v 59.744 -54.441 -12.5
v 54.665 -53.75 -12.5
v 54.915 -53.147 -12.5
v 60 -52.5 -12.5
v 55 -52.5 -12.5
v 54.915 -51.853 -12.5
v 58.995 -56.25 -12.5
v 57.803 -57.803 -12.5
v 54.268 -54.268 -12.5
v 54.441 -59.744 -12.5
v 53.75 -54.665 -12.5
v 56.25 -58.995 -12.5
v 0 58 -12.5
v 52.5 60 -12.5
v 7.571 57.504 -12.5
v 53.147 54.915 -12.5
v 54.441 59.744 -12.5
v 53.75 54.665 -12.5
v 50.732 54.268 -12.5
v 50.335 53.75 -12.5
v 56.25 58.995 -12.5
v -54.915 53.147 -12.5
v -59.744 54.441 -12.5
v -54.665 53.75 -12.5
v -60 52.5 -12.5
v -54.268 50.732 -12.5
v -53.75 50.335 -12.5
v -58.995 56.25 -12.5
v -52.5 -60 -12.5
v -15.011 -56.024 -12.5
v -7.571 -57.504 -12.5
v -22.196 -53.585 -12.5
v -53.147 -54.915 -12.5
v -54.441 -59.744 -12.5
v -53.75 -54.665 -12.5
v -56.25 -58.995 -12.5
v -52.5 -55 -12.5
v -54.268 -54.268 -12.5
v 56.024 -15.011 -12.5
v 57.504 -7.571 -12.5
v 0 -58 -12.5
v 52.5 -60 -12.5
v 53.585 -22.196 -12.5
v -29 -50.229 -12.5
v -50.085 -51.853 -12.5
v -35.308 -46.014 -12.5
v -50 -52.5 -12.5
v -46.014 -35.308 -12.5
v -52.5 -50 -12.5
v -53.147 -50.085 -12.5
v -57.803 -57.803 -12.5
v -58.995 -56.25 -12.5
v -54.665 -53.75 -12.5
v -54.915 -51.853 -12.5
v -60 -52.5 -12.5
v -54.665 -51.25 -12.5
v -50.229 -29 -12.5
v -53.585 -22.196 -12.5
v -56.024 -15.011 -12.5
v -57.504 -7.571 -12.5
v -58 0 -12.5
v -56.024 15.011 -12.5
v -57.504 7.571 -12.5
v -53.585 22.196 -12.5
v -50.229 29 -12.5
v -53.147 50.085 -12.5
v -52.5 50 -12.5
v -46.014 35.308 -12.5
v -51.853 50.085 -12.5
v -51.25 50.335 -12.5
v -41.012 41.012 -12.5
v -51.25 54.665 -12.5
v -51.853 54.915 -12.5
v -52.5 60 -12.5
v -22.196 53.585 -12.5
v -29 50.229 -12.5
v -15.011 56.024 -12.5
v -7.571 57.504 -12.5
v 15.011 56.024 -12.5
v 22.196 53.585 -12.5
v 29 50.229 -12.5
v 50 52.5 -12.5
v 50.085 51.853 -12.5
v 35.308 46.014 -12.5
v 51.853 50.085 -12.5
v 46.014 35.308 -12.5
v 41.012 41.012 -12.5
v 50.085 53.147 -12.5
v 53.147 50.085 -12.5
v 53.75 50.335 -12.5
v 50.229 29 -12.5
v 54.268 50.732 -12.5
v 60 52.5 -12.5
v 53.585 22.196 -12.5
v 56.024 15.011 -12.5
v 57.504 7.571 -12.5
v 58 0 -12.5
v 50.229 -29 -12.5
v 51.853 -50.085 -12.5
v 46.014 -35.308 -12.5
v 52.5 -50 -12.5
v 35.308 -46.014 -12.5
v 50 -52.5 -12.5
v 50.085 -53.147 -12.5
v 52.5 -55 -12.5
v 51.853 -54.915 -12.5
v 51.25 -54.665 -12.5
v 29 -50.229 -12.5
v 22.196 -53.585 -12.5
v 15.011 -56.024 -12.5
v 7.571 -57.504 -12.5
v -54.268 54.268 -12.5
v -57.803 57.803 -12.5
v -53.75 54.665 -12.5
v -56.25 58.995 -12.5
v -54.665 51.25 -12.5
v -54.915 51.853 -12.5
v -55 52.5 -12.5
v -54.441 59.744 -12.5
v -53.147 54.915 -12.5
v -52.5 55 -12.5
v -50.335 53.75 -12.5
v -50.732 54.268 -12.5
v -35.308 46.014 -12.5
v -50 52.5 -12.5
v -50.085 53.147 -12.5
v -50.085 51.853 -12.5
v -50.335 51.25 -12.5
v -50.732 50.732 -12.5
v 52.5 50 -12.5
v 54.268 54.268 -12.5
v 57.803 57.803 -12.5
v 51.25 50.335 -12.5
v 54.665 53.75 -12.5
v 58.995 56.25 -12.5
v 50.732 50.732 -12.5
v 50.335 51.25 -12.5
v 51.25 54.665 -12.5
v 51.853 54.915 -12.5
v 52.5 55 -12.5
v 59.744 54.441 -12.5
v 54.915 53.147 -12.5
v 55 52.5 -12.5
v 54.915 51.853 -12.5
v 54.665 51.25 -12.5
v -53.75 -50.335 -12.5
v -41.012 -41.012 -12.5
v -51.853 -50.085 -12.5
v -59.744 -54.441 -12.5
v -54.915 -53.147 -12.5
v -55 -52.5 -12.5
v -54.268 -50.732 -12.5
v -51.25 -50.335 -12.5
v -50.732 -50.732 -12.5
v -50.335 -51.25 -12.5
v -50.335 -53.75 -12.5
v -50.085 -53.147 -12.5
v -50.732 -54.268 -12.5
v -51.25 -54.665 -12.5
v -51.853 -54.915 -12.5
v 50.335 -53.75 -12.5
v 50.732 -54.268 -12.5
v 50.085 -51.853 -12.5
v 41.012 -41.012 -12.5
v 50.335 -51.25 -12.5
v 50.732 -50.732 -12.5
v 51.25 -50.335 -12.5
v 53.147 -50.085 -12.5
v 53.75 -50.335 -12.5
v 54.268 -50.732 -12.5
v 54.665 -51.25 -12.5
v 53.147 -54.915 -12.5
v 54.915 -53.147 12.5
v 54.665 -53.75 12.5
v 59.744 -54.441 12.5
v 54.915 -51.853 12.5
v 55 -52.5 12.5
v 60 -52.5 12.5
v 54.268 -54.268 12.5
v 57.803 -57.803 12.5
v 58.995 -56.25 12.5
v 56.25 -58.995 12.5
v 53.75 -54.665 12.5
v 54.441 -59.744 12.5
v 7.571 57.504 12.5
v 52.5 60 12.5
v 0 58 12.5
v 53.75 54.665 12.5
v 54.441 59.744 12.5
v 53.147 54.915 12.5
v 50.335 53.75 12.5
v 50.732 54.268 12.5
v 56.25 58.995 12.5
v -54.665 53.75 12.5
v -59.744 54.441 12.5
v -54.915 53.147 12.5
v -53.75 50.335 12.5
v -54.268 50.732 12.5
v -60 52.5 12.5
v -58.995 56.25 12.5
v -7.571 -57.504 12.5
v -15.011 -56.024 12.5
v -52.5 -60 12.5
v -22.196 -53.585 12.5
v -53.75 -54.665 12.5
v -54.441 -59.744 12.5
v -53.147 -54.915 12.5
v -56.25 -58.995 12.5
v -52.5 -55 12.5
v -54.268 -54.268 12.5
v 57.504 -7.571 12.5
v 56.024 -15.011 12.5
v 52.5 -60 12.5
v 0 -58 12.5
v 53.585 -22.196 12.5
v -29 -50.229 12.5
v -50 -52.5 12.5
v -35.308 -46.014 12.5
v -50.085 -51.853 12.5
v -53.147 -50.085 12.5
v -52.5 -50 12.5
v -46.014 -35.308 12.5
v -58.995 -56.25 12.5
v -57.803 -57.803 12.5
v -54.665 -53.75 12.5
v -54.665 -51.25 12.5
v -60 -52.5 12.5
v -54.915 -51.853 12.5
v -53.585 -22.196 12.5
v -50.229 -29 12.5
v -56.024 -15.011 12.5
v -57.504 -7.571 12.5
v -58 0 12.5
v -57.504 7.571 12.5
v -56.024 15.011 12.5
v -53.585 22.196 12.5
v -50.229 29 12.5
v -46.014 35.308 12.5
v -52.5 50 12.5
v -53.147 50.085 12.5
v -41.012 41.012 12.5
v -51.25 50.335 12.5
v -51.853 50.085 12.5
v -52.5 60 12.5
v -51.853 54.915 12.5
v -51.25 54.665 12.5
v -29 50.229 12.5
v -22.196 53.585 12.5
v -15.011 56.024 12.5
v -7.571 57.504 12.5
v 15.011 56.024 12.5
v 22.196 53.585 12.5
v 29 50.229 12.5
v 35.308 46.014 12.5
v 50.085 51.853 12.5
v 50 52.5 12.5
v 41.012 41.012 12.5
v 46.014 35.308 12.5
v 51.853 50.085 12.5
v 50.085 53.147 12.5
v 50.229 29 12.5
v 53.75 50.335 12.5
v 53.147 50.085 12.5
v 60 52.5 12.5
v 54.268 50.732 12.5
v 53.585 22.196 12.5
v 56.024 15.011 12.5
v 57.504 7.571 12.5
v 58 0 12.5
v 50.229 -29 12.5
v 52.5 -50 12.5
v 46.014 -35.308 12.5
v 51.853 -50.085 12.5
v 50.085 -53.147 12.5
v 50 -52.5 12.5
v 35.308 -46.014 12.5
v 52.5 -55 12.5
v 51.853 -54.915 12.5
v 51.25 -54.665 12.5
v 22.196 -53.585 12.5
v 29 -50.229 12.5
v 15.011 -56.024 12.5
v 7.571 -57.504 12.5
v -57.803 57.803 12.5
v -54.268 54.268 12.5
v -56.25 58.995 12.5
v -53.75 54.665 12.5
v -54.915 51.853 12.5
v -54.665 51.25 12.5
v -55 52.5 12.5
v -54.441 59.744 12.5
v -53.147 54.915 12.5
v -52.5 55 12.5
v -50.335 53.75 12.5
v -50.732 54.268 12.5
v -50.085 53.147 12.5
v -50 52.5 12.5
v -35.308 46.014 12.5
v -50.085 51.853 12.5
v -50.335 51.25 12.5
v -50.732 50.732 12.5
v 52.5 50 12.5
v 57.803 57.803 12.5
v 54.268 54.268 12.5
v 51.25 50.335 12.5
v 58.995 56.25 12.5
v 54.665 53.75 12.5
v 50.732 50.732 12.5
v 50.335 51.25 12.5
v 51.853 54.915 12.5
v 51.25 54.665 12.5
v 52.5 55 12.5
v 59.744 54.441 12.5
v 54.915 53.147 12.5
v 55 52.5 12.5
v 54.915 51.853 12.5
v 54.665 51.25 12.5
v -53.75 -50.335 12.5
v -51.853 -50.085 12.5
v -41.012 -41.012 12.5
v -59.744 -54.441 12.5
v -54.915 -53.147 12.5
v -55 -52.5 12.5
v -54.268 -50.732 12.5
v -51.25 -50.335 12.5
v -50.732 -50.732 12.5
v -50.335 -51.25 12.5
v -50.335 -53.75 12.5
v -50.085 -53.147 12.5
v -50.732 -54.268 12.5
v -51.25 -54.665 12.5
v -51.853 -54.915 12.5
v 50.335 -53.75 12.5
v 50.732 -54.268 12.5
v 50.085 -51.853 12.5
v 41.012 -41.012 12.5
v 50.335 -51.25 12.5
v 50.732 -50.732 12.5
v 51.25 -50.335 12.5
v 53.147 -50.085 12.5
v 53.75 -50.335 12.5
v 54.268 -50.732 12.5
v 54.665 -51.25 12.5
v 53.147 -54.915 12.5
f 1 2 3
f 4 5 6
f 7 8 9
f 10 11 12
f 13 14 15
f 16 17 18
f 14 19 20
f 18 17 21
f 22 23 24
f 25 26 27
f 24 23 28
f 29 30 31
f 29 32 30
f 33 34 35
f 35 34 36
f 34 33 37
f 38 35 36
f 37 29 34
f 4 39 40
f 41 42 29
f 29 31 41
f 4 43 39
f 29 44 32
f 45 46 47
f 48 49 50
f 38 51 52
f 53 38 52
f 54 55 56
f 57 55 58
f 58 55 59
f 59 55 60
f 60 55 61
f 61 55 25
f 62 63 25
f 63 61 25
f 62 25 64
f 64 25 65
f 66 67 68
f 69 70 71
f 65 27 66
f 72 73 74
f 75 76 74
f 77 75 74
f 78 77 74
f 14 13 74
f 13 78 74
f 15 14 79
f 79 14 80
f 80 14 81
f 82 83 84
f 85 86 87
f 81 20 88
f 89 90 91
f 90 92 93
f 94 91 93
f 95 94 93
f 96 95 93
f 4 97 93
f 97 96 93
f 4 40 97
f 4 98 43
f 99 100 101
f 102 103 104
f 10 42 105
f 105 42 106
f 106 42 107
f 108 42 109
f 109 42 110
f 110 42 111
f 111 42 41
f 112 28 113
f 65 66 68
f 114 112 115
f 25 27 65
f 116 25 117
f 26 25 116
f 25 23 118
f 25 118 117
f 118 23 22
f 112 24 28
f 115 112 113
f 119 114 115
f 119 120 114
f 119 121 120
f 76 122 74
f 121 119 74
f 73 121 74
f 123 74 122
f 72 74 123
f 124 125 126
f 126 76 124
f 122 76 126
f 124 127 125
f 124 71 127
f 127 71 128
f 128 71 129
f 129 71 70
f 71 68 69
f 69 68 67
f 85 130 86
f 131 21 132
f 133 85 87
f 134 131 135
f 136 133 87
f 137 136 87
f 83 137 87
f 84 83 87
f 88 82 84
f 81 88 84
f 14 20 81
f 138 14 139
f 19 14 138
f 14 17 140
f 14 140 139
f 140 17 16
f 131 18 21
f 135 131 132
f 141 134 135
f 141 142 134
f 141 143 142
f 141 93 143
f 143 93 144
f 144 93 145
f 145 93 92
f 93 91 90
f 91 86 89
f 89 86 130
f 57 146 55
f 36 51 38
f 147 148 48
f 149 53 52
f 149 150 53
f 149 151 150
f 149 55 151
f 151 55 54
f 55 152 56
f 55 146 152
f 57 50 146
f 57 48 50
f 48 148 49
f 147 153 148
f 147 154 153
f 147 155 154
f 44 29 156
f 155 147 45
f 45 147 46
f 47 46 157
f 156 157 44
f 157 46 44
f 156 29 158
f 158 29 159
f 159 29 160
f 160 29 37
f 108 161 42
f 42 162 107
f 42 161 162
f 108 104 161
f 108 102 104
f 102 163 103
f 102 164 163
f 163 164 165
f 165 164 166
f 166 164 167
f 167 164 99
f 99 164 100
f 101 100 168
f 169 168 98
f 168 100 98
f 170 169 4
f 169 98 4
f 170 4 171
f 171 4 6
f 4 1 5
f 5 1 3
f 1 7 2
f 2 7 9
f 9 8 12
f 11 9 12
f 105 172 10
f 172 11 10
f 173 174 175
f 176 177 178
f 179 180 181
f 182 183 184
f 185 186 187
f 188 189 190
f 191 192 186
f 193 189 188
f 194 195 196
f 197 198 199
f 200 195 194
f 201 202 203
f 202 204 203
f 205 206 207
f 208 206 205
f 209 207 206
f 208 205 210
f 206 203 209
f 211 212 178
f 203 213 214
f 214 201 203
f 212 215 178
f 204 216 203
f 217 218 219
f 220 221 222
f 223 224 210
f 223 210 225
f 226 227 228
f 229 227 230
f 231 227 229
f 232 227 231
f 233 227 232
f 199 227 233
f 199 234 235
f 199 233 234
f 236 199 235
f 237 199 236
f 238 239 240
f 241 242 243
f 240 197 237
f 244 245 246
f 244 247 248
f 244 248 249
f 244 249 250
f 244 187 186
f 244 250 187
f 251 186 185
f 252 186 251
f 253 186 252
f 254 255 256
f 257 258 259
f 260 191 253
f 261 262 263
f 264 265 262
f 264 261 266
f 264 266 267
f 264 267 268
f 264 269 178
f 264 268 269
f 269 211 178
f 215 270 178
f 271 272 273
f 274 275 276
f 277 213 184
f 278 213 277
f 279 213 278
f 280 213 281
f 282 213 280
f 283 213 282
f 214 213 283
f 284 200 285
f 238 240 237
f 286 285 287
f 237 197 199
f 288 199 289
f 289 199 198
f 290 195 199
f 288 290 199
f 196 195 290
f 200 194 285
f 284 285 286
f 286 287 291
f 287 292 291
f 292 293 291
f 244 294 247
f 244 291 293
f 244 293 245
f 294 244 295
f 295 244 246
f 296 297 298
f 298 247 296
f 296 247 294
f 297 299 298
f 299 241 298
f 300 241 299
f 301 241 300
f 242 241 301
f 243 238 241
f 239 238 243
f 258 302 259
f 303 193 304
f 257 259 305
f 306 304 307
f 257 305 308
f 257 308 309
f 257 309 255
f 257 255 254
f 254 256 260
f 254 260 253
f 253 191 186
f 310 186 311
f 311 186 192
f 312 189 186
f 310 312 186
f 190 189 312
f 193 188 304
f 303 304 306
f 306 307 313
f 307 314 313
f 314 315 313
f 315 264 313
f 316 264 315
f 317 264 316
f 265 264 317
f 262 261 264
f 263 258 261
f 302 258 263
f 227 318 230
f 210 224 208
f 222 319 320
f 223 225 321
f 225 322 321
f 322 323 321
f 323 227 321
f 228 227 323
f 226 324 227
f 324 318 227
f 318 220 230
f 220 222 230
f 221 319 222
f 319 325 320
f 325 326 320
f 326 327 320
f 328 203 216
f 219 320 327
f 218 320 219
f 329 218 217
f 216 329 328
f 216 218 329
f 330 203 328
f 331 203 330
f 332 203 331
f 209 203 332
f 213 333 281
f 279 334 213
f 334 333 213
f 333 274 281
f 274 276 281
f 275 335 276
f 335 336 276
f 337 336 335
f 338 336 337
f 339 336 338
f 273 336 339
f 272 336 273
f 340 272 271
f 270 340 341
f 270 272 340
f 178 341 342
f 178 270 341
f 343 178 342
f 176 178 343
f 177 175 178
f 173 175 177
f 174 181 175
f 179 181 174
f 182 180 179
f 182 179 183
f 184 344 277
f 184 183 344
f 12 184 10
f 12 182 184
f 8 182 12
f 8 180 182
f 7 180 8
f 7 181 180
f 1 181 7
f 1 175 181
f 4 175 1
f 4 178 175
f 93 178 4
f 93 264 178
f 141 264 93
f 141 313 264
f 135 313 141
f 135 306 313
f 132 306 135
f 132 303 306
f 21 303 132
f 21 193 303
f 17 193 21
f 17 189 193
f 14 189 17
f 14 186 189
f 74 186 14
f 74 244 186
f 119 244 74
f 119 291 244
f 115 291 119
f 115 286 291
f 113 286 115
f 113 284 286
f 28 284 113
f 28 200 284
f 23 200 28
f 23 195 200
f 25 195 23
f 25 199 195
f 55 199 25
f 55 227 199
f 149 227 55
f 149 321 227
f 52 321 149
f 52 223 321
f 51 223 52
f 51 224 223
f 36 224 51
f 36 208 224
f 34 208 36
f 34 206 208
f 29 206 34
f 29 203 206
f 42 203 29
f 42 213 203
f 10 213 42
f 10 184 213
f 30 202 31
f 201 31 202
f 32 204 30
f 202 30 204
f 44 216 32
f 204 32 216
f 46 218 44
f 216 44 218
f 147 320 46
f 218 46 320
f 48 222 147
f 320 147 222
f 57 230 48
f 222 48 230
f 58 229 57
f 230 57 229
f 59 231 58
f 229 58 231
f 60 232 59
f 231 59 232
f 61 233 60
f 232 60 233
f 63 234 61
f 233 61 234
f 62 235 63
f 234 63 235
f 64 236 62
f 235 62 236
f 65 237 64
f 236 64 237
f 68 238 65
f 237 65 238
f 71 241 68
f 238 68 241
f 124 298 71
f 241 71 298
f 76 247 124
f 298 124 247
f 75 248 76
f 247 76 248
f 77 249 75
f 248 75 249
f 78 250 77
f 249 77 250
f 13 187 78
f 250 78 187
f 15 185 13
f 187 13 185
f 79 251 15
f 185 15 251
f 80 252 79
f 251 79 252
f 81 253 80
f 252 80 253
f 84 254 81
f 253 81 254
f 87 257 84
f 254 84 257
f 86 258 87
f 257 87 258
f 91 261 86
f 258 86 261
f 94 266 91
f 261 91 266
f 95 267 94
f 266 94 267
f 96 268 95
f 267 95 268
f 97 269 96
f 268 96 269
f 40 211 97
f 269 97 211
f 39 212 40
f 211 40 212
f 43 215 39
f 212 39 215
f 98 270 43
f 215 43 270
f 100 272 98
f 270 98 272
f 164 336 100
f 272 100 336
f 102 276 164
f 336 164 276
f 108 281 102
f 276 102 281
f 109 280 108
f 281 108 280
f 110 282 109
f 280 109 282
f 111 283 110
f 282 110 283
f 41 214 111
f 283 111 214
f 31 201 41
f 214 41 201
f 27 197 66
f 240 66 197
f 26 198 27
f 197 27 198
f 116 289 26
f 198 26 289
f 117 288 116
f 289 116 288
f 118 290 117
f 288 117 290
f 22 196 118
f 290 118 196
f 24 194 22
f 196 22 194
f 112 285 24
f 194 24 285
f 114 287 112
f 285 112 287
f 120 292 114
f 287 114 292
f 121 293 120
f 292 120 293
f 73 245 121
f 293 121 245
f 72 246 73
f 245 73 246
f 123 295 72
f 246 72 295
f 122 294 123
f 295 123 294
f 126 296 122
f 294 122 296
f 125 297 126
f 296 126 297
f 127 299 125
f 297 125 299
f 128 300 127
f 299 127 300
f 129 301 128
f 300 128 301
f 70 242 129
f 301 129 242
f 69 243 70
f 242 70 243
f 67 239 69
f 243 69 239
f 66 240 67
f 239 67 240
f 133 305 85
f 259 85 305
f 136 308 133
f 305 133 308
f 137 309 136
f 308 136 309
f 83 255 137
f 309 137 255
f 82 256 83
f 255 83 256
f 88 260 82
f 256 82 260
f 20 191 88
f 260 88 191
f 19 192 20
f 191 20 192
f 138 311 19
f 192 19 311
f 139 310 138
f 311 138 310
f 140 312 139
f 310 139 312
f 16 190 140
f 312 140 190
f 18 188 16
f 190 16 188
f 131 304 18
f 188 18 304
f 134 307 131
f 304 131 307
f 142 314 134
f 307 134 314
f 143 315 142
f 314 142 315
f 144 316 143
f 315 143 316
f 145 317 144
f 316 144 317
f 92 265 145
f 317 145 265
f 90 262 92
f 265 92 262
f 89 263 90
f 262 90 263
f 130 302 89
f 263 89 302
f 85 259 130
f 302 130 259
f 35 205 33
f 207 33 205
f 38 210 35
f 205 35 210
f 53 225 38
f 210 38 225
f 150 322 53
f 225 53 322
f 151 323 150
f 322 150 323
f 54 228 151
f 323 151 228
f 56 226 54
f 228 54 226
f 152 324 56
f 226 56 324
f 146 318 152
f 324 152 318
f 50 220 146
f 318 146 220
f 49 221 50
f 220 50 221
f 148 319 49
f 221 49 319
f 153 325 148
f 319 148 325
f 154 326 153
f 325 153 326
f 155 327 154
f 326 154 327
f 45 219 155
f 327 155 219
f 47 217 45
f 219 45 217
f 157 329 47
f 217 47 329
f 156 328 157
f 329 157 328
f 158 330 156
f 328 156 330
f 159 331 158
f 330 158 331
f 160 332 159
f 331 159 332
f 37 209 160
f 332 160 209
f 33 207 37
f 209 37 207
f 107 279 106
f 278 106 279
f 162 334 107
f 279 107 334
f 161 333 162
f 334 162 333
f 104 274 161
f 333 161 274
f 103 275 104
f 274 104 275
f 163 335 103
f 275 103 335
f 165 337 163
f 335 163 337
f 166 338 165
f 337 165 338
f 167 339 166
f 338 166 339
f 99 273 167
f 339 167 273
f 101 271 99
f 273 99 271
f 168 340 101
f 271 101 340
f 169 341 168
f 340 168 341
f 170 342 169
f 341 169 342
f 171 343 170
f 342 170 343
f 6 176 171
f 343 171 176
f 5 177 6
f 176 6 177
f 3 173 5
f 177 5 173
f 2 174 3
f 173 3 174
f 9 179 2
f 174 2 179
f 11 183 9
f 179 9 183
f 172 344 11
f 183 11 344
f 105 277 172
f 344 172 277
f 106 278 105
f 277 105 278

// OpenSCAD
// file: ../lib/TOGArrayLib1.scad
// TOGArrayLib1.4
// 
// Functions for working with arrays.
// 
// v1.1:
// - tal1_reduce assert(is_list(items)) to prevent infinite recursion
//   when given undefined or other non-list values
// v1.1.1:
// - Fix tal1_uniq_remap_v2 to return "list-remap-result" as the
//   first element of the returned list
// v1.2:
// - Add tal1_replace_at function
// v1.3:
// - tal1_is_vec_of, tal1_is_vec_of_num
// v1.4:
// - tal1_assert_for_each, for when you want to assert something
//   about each of a list of items and get nice failure messages

/**
 * Make a list with the contents of list `a`,
 * but starting at offset `off`, replaced by the contents of list `b`.
 * len(result) = max(len(a), off+len(b))
 */
function tal1_replace_at(a, off, b, default_value=undef, default_value_function=undef) =
	assert(is_list(a))
	assert(is_list(b))
	let( _dvf = !is_undef(default_value_function) ? default_value_function : function(i) default_value )
[
	for( i=[0:1:min(off,len(a))-1] ) a[i],
	for( i=[len(a):1:off-1] ) _dvf(i),
	for( i=[off:1:off+len(b)-1] ) b[i-off],
	for( i=[off+len(b):1:len(a)-1] ) a[i],
];

// Simplest case
assert([] == tal1_replace_at([], 0, []));
// Second simplest cases
assert(["foo"] == tal1_replace_at(["foo"], 0, []));
assert(["foo"] == tal1_replace_at([], 0, ["foo"]));
// Replace one item
assert(["foo","quux","baz"] == tal1_replace_at(["foo","bar","baz"], 1, ["quux"]));
// Replace and extend
assert(["foo","quux","tuna","tina"] == tal1_replace_at(["foo","bar","baz"], 1, ["quux", "tuna", "tina"]));
// Add beyond end of `a`
assert(["foo","zzz","quux"] == tal1_replace_at(["foo"], 2, ["quux"], default_value="zzz"));
// Adding 'nothing' should still fill to that point with defaults
assert(["foo","zzz","zzz"] == tal1_replace_at(["foo"], 3, [], default_value="zzz"));


function tal1_reduce(start, items, func, offset=0) =
	assert(is_list(items))
	len(items) == offset ? start :
	tal1_reduce(func(start, items[offset]), items, func, offset+1);

function tal1_consecutive_duplicate_count(items) = tal1_reduce(
	[0, undef],
	items,
	function(z,item) [z[0] + (item == z[1] ? 1 : 0), item]
)[0];

assert(0 == tal1_consecutive_duplicate_count([]));
assert(0 == tal1_consecutive_duplicate_count([50]));
assert(1 == tal1_consecutive_duplicate_count([50,50]));
assert(0 == tal1_consecutive_duplicate_count([50,51,52,53]));
assert(1 == tal1_consecutive_duplicate_count([50,51,52,52]));
assert(3 == tal1_consecutive_duplicate_count([50,50,50,50]));

// Set test_size to arbirarily large values
// to ensure that OpenSCAD can handle heavy recursion
let(test_size=1000) assert(test_size/2 == tal1_consecutive_duplicate_count([for(i=[0:1:test_size-1]) floor(i/2)]));



function tal1_uniq_(items, off0, off1) =
	let(chunklen = off1-off0)
	chunklen == 0 ? [] :
	chunklen == 1 ? [items[off0]] :
	let(half=floor(chunklen/2))
	let(left  = tal1_uniq_(items, off0     , off0+half))
	let(right = tal1_uniq_(items, off0+half, off1     ))
	assert(len(left) > 0)
	assert(len(right) > 0)
	left[len(left)-1] == right[0] ? [each left, for(i=[1:1:len(right)-1]) right[i]] :
	[each left, each right];

/** Given a list of items, returns a new list with identical consecutive items merged */
function tal1_uniq(items) = tal1_uniq_(items, 0, len(items));

assert([] == tal1_uniq([]));
assert([123] == tal1_uniq([123]));
assert([55,0,1,2,3] == tal1_uniq([55,0,1,2,3]));
assert([55,0,1,2] == tal1_uniq([55,0,1,1,2]));
assert([55,0,1] == tal1_uniq([55,55,0,0,0,0,0,0,1,1,1,1]));
assert([55,0] == tal1_uniq([55,0,0,0,0,0,0,0]));



/**
 * Returns [new items, old index -> new index mapping].
 * No-op version.
 */
function tal1_uniq_remap_v1(items) =
	["list-remap-result", items, [for (vi=[0:1:len(items)-1]) vi]];

// [a, a, b, b, c, c]
//
// [a,    ...], []  -> [a],[0]
// [a, a, ...], [0] -> [a],[0,0]

assert([1,2,3] == [1,2,3]);

/**
 * Recursive version that will combine adjacent identical vertexes,
 * but will use the original items.
 */
function tal1_uniq_remap_v2(items, map=[]) =
	let(index = len(map))
	len(items) == index ? ["list-remap-result", items, map] :
	index == 0 ? tal1_uniq_remap_v2(items, [0]) :
	items[index] == items[map[index-1]] ? tal1_uniq_remap_v2(items, [for(vi=map) vi, map[index-1]]) :
	tal1_uniq_remap_v2(items, [for(vi=map) vi, index]);

assert(tal1_uniq_remap_v2([1,1,2,2,3,4]) == ["list-remap-result", [1,1,2,2,3,4], [0,0,2,2,4,5]]);


/**
 * Returns true if `vec` is a list of at least min_len items
 * and component_check(each item, even those beyond min_len) is true.
 */
function tal1_is_vec_of(vec, min_len=0, component_check=function(x) true) =
	assert(is_num(min_len) && min_len >= 0)
	assert(is_function(component_check))
	is_list(vec) && len(vec) >= min_len &&
	tal1_reduce(true, vec, function(prev,item) prev && component_check(item));

function tal1_is_vec_of_num(vec, min_len=0) = tal1_is_vec_of(vec, min_len, function(i) is_num(i));

assert( true == tal1_is_vec_of_num([1,2,3]));
assert( true == tal1_is_vec_of_num([]));
assert( true == tal1_is_vec_of_num([1,2,3], 3));
assert(false == tal1_is_vec_of_num([1,2], 3));
assert(false == tal1_is_vec_of_num([1,2,"spoon"], 3));
// Requirements are ambiguous when
// first min_len items are numbers, but there are non-numeric items afterwards,
// so let's error on the side of saying 'no, it's not a list of numbers';
// i.e. the item check and the min_len are independent.
assert(false == tal1_is_vec_of_num([1,2,3,"artichoke"], 3));


/**
 * Asserts that item_checker(each item in list, index of item)[0] is true.
 * Second element of item_checker return value is assertion message.
 * Returns the original list, in case that's useful to you.
 */
function tal1_assert_for_each(list, item_checker) =
	let( _ignored = [ for(i=[0:1:len(list)-1])
		let(q=item_checker(list[i],i))
		let(passed=is_bool(q) ? q : is_list(q) ? q[0] : assert(false, str(
			"tal1_assert_for_each: item_checker should return Bool|[Bool,String], but returned ",
			q, " for item at index ", i)))
		let(message=is_list(q) ? q[1] : undef)
		assert(passed, message)
		q
	])
	list;

// Callback can return a boolean...
assert([1,2,3] == tal1_assert_for_each([1,2,3], function(v,i) is_num(v)));
// ...or a [boolean, string]
assert([1,2,3] == tal1_assert_for_each([1,2,3], function(v,i) [is_num(v), "element be a num"]));
// file: ../lib/TOGMod1Constructors.scad
// TOGMod1Constructors-v1.5
// 
// Functions to construct objects understood by TOGMod1
// 
// v1.1:
// - Add togmod1_make_rounded_rect
// v1.2:
// - togmod1_make_rounded_rect can make ovals
// v1.3:
// - togmod1_circle_points, to just get the points of a circle
// - if pos parameter to circle function has a third element,
//   returned vertexes will include it as the z component;
// v1.3.1
// - Some assertions
// v1.4:
// - Refactor togmod1_rounded_rect_points and togmod1_circle_points
//   to use togmod1__make_nd_vector_adder for adapting to whatever
//   `pos` parameter is.
// v1.5:
// - togmod_rounded_rect_points will not simplify completely rounded sides
//   (where length of side is exactly twice the rounding radius)
//   unless simplify_rounded_sides=true
//   - This makes it more useful for polyhedron generation,
//     where radius varies, but number of points must remain constant.

use <./TOGArrayLib1.scad>

function togmod1__make_nd_vector_adder(origin=[0,0]) =
	let(origin_is_zero = tal1_reduce(true, origin, function(prev,item) prev && item == 0))
	origin_is_zero ? (function(vec) len(vec) >= len(origin) ? vec : tal1_replace_at(origin, 0, vec)) :
	function(vec) [
		for(i=[0:1:max(len(origin),len(vec))-1]) (len(vec) > i ? vec[i] : 0) + (len(origin) > i ? origin[i] : 0),
	];

assert([1,2,3] == togmod1__make_nd_vector_adder()([1,2,3]));
echo(togmod1__make_nd_vector_adder([0,0,3])([1,2]));
assert([1,2,3] == togmod1__make_nd_vector_adder([0,0,3])([1,2]));


function togmod1_make_cuboid(size) =
	assert(is_list(size))
	assert(len(size) >= 3)
	assert(is_num(size[0]))
	assert(is_num(size[1]))
	assert(is_num(size[2]))
	["polyhedron-vf", [
		[-size[0]/2, -size[1]/2, -size[2]/2],
		[+size[0]/2, -size[1]/2, -size[2]/2],
		[-size[0]/2, +size[1]/2, -size[2]/2],
		[+size[0]/2, +size[1]/2, -size[2]/2],
		[-size[0]/2, -size[1]/2, +size[2]/2],
		[+size[0]/2, -size[1]/2, +size[2]/2],
		[-size[0]/2, +size[1]/2, +size[2]/2],
		[+size[0]/2, +size[1]/2, +size[2]/2]
	], [
		[0,1,3,2],[0,4,5,1],[4,6,7,5],[3,7,6,2],[1,5,7,3],[6,4,0,2]
	]];

function togmod1_make_polygon(verts) =
	["polygon-vp", verts, [[for( i=[0:1:len(verts)-1] ) i%len(verts)]]];

function togmod1_rounded_rect_points(size, r, pos=[0,0], simplify_rounded_sides=false) =
	assert(is_list(size))
	assert(len(size) >= 2)
	let(radii = is_list(r) ? r : is_num(r) ? [r,r] : assert(false, "rounded_rect r(adius) should be list<num> or num"))
	let(rx = radii[0])
	let(ry = radii[1])
	assert(is_num(rx))
	assert(is_num(ry))
	assert(size[0] >= 2*rx, str("size[0] must be >= 2*r[0]; size[0] = ",size[0],", 2*r[0] = ",2*rx))
	assert(size[1] >= 2*ry, str("size[1] must be >= 2*r[1]; size[1] = ",size[1],", 2*r[1] = ",2*ry))
	let(quarterfn=max($fn/4, 1))
	let(qfnx = simplify_rounded_sides && size[0] == 2*rx ? quarterfn-1 : quarterfn)
	let(qfny = simplify_rounded_sides && size[1] == 2*ry ? quarterfn-1 : quarterfn)
	let(finalizepos = togmod1__make_nd_vector_adder(pos))
[
	for(a=[0 : 1 : qfnx]) let(ang=      a*90/quarterfn) finalizepos([ size[0]/2-rx + rx*cos(ang),  size[1]/2-ry + ry*sin(ang)]),
	for(a=[0 : 1 : qfny]) let(ang= 90 + a*90/quarterfn) finalizepos([-size[0]/2+rx + rx*cos(ang),  size[1]/2-ry + ry*sin(ang)]),
	for(a=[0 : 1 : qfnx]) let(ang=180 + a*90/quarterfn) finalizepos([-size[0]/2+rx + rx*cos(ang), -size[1]/2+ry + ry*sin(ang)]),
	for(a=[0 : 1 : qfny]) let(ang=270 + a*90/quarterfn) finalizepos([ size[0]/2-rx + rx*cos(ang), -size[1]/2+ry + ry*sin(ang)]),
];

function togmod1_make_rounded_rect(size, r) =
	togmod1_make_polygon(togmod1_rounded_rect_points(size,r,simplify_rounded_sides=true));

function togmod1_circle_points(r, pos=[0,0], d=undef) =
	assert( !is_undef(r) || !is_undef(d) )
	assert(!is_undef(pos[0]))
	assert(!is_undef(pos[1]))
	let(finalizepos = togmod1__make_nd_vector_adder(pos))
	let(r_ = !is_undef(r) ? r : d/2)
	let(fn = max($fn, 6))
	[for(i=[0 : 1 : fn-1]) finalizepos([r_*cos(i*360/fn), r_*sin(i*360/fn)])];

function togmod1_make_circle(r, pos=[0,0], d=undef) =
	togmod1_make_polygon(togmod1_circle_points(r=r, pos=pos, d=d));

function togmod1_make_cylinder(d, zrange=[0,1], r=undef, pos=[0,0]) =
	assert( !is_undef(r) || !is_undef(d) )
	let( r_ = !is_undef(r) ? r : d/2 )
	// TODO: Make polyhedron directly
	["linear-extrude-zs", zrange, togmod1_make_circle(r=r_, pos=pos)];

function togmod1__is_range1d(range) = is_list(range) && len(range) == 2 && is_num(range[0]) && is_num(range[1]);

function togmod1_linear_extrude_z(range, shape) =
	assert(togmod1__is_range1d(range))
	["linear-extrude-zs", range, shape];
function togmod1_linear_extrude_x(range, shape) =
	assert(togmod1__is_range1d(range))
	["rotate", [90, 0, 90], togmod1_linear_extrude_z(range, shape)];
function togmod1_linear_extrude_y(range, shape) =
	assert(togmod1__is_range1d(range))
	["rotate", [90, 0, 180], togmod1_linear_extrude_z(range, shape)];
// file: ../lib/TOGMod1.scad
// TOGMod1
// OpenSCAD library for representing shapes
// 
// See also: Functional OpenSCAD (https://github.com/thehans/FunctionalOpenSCAD)

module togmod1_domodule(mod) {
	assert(is_list(mod));
	assert(len(mod) > 0);
	if( mod[0] == "polygon-vp" ) {
		// ["polygon-vp", vertexes, paths]
		polygon(points=mod[1], paths=mod[2]);
	} else if( mod[0] == "polyhedron-vf" ) {
		polyhedron(mod[1], faces=mod[2]);
	} else if( mod[0] == "scale" ) {
		assert(len(mod) == 3);
		scale(mod[1]) togmod1_domodule(mod[2]);
	} else if( mod[0] == "translate" ) {
		assert(len(mod) == 3);
		assert(is_list(mod[1]));
		for(c=mod[1]) assert(is_num(c), "translate component should be numeric");
		translate(mod[1]) togmod1_domodule(mod[2]);
	} else if( mod[0] == "rotate" ) {
		assert(len(mod) == 3);
		rotate(mod[1]) togmod1_domodule(mod[2]);
	} else if( mod[0] == "intersection" ) {
		intersection_for( i=[1:1:len(mod)-1] ) togmod1_domodule(mod[i]);
	} else if( mod[0] == "difference" ) {
		difference() {
			togmod1_domodule(mod[1]);
			for( i=[2:1:len(mod)-1] ) togmod1_domodule(mod[i]);
		}
	} else if( mod[0] == "union" ) {
		for( i=[1:1:len(mod)-1] ) togmod1_domodule(mod[i]);
	} else if( mod[0] == "hull" ) {
		hull() for( i=[1:1:len(mod)-1] ) togmod1_domodule(mod[i]);
	} else if( mod[0] == "offset-rs" ) {
		assert(len(mod) == 3);
		assert(is_num(mod[1]));
		assert(is_list(mod[2]));
		offset(mod[1]) togmod1_domodule(mod[2]);
	} else if( mod[0] == "linear-extrude-zs" ) {
		// ["linear-extrude-zs", [z0,z1], 2d_shape] // centered
		// ["linear-extrude-zs", height, 2d_shape]
		let( zrange = is_list(mod[1]) ? mod[1] : [-mod[1]/2, mod[1]/2] ) {
			translate([0,0,zrange[0]]) linear_extrude(zrange[1]-zrange[0]) togmod1_domodule(mod[2]);
		}
	} else if( mod[0] == "render" ) {
		render() togmod1_domodule(mod[1]);
	} else if( mod[0] == "minkowski" ) {
		minkowski() {
			togmod1_domodule(mod[1]);
			togmod1_domodule(mod[2]);
		}
	} else if( mod[0] == "x-debug" ) {
		# togmod1_domodule(mod[1]);
	} else {
		assert(false, str("Unrecognized shape: ", mod[0]));
	}
}
// main file
use <../lib/TOGMod1.scad>
use <../lib/TOGMod1Constructors.scad>
use <../lib/TOGPolyhedronLib1.scad>

$fn = 24;

function make_case_fan( size ) =
	let( mounting_hole = togmod1_make_circle(r=2.5) )
	["linear-extrude-zs",
		[-size[2]/2, size[2]/2],
		["difference",
			togmod1_make_rounded_rect(size, r=7.5),
			togmod1_make_circle(r = min(size[0],size[1])/2 - 2, $fn=max($fn,48)),
			for( xm=[-1,1] ) for( ym=[-1,1] ) ["translate", [xm*(size[0]/2 - 7.5), ym*(size[1]/2-7.5), 0], mounting_hole],
		]
	];

togmod1_domodule(make_case_fan([120,120,25]));
